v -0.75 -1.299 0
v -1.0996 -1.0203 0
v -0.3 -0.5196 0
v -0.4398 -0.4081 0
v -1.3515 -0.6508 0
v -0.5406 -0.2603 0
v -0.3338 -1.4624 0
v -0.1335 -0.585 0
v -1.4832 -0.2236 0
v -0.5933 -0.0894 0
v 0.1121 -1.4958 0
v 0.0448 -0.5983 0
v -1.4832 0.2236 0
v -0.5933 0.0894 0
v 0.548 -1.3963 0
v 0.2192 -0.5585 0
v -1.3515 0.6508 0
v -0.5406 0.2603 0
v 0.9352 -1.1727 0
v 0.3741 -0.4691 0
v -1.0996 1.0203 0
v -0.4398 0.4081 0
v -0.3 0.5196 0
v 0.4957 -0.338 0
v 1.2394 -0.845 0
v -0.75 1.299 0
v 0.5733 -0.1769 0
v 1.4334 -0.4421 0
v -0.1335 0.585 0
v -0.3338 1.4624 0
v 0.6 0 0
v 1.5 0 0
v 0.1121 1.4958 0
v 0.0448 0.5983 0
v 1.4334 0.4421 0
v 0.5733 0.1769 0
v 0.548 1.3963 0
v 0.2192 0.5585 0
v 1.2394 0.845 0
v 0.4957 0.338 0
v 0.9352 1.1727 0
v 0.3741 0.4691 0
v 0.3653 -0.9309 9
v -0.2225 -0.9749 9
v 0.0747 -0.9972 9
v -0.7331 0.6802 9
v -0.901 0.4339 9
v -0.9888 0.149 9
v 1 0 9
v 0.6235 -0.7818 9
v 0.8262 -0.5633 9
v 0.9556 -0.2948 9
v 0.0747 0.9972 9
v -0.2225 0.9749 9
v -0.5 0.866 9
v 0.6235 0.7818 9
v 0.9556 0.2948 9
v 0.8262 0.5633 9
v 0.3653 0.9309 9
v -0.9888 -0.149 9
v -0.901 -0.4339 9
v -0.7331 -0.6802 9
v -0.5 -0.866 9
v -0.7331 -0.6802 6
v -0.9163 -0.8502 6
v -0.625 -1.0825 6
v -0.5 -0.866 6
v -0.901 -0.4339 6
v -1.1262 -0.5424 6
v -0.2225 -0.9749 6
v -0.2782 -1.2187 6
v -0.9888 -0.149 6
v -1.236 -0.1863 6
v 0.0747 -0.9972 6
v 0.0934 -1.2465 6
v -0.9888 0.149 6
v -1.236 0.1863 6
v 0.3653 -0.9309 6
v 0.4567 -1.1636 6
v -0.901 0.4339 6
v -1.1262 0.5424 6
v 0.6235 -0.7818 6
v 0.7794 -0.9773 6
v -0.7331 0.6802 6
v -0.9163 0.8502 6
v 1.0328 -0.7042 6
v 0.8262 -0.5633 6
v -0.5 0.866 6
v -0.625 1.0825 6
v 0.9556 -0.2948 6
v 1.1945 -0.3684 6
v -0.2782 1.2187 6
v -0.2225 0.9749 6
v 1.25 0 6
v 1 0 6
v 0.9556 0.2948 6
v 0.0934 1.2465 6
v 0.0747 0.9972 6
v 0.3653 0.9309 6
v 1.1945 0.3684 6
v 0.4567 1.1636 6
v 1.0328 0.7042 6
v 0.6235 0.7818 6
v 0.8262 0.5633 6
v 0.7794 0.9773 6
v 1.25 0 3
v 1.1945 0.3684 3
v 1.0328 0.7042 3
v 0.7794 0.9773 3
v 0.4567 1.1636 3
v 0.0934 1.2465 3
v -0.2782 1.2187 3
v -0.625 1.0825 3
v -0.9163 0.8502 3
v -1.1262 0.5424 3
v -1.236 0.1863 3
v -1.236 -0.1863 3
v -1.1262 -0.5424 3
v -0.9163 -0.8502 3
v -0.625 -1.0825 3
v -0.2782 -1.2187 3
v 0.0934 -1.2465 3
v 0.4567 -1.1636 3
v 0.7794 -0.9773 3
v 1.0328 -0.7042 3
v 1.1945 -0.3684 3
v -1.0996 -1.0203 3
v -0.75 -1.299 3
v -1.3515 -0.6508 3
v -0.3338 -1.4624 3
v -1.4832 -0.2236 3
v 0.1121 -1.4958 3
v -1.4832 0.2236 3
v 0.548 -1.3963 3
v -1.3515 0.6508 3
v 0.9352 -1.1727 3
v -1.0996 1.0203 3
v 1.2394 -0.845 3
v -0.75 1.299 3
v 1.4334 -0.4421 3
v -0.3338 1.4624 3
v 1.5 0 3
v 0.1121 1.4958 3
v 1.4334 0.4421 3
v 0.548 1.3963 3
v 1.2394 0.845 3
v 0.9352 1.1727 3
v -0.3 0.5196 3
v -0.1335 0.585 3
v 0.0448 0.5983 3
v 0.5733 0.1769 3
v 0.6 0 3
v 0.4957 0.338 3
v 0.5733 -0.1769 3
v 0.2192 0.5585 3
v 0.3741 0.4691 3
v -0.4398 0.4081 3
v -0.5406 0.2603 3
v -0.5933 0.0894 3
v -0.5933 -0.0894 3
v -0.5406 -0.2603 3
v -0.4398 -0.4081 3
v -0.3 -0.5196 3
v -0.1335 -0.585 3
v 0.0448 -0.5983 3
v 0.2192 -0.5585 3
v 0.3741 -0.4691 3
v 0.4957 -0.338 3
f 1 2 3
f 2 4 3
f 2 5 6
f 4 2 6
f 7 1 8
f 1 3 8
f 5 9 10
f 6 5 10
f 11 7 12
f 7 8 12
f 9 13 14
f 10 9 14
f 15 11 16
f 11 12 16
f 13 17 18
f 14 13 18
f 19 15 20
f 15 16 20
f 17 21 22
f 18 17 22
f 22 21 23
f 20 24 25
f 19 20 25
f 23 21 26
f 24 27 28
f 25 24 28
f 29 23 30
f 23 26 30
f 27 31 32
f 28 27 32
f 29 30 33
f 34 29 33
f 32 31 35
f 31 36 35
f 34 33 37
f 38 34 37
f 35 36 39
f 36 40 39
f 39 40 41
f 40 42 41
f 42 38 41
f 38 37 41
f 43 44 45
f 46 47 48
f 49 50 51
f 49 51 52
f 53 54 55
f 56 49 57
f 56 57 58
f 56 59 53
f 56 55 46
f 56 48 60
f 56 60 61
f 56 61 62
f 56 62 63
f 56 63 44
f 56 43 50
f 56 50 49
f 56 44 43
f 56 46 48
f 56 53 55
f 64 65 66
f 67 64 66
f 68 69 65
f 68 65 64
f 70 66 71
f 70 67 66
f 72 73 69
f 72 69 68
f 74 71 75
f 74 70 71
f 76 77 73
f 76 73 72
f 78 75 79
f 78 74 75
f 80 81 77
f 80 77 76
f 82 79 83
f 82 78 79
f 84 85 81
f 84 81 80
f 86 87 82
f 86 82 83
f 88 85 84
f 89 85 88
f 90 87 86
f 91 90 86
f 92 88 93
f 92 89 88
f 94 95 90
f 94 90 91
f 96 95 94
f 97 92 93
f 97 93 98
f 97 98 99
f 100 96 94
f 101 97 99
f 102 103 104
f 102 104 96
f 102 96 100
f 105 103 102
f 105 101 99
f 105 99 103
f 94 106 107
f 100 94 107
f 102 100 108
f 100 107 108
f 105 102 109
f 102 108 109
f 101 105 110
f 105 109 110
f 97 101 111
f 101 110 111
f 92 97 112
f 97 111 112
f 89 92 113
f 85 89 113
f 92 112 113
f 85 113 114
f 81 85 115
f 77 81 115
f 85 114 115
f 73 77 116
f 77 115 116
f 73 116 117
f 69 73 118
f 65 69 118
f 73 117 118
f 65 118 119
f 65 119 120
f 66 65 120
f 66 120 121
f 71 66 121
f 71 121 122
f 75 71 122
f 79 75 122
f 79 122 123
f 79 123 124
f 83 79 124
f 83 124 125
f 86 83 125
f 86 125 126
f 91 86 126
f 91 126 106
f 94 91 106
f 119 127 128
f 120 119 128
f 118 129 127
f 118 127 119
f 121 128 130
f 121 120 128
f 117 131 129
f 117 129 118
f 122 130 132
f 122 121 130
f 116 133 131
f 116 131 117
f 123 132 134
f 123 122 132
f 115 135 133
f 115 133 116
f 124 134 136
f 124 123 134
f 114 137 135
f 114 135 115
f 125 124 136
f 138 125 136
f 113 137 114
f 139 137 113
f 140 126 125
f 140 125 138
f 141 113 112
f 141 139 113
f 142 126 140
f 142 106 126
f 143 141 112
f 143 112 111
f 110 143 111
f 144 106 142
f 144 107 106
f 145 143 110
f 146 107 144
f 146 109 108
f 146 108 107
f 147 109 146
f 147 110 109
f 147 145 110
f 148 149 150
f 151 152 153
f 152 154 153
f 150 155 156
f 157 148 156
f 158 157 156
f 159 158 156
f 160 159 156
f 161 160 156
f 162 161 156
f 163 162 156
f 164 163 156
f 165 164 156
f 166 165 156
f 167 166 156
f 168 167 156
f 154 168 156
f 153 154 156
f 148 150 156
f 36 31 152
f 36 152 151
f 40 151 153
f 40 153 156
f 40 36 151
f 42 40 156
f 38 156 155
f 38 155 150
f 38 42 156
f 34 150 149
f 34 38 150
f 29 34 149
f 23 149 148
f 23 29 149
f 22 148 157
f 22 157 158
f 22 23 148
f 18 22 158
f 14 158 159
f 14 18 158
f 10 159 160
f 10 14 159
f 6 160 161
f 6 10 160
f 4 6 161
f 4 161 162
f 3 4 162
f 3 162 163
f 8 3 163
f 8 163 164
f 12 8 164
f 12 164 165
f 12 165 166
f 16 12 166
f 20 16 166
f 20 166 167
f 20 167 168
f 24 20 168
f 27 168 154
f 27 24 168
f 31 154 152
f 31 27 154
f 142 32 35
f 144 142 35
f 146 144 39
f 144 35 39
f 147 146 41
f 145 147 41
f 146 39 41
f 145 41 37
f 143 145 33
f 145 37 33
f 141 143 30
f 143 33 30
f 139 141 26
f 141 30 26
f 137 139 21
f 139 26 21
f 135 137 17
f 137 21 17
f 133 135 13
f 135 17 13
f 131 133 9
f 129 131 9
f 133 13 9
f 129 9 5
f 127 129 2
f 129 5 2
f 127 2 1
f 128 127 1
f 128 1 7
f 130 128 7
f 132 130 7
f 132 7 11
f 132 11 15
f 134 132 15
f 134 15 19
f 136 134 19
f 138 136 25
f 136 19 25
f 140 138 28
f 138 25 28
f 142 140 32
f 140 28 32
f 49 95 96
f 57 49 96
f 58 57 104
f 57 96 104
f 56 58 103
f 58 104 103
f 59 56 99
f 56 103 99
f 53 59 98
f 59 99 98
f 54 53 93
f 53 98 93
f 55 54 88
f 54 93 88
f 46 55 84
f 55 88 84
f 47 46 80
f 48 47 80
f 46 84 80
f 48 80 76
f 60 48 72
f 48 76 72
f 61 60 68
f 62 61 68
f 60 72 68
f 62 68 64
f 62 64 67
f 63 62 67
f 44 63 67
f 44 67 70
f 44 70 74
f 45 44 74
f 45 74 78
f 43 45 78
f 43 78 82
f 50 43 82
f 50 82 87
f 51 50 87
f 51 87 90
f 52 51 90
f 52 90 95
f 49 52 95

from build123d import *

# Parameters (mm, degrees)
F1_R     = 1.25
F2_DEPTH = 6
F0_R     = 1
F3_DEPTH = 9
F4_R     = 1.5
F5_DEPTH = 3
F6_R     = 0.6
F7_DEPTH = 3


with BuildPart() as f2:
    # F1 (on Top) → F2 (new body)
    with BuildSketch(Plane.XY):
        Circle(F1_R)
    extrude(amount=F2_DEPTH)

    # F0 (on Top) → F3 (join)
    with BuildSketch(Plane.XY):
        Circle(F0_R)
    extrude(amount=F3_DEPTH)

    # F4 (on Top) → F5 (join)
    with BuildSketch(Plane.XY):
        Circle(F4_R)
    extrude(amount=F5_DEPTH)

    # F6 (on Top) → F7 (cut)
    with BuildSketch(Plane.XY):
        Circle(F6_R)
    extrude(amount=F7_DEPTH, mode=Mode.SUBTRACT)


solid = f2.part
